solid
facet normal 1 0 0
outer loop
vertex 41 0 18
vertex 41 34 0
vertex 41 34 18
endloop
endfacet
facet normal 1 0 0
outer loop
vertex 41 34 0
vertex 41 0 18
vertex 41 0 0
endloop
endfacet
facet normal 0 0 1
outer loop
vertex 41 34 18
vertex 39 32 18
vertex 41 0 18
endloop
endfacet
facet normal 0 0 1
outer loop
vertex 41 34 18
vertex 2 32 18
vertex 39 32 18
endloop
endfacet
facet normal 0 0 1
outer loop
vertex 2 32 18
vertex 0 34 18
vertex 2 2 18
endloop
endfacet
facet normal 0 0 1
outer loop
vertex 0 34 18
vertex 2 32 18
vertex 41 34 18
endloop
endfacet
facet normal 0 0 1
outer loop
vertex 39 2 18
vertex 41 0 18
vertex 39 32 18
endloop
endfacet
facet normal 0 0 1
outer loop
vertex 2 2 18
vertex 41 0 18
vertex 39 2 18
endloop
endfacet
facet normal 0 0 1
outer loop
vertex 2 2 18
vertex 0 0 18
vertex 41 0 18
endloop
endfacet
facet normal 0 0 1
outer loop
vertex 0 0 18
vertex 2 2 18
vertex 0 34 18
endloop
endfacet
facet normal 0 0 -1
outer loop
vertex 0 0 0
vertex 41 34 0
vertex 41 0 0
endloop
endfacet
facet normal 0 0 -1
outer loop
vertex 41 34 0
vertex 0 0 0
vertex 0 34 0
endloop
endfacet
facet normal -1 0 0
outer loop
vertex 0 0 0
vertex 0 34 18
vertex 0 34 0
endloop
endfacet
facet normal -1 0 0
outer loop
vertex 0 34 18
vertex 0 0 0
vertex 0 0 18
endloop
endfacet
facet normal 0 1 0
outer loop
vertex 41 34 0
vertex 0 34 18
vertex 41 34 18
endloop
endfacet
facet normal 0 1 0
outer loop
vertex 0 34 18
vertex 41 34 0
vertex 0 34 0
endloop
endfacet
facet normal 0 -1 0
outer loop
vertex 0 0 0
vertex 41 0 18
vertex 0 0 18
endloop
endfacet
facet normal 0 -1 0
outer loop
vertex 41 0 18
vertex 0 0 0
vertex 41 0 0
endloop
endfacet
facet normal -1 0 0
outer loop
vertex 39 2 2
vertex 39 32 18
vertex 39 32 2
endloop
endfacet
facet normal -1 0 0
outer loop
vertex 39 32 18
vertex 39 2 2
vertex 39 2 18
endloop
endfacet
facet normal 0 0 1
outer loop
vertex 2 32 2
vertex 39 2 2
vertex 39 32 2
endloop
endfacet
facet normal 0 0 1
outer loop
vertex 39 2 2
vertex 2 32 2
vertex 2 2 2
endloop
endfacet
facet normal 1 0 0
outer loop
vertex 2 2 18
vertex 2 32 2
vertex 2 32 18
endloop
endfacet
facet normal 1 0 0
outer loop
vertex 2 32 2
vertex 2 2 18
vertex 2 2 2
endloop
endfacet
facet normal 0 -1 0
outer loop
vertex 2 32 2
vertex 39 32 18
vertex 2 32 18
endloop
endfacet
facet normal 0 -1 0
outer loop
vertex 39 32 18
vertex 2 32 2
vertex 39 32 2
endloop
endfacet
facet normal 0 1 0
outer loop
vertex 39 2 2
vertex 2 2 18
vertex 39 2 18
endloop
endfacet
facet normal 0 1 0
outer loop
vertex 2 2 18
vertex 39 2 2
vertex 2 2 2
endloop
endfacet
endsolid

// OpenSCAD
b_x = 37;
b_y = 30;
b_z = 14;
wall_thick = 2;
ovr_x = 1.5;
ovr_y = 1;
e = 0.1;

difference() {
    cube([b_x+wall_thick*2, b_y+wall_thick*2, b_z+wall_thick*2]);
    
    translate([wall_thick, wall_thick, wall_thick])
        cube([b_x, b_y, b_z]);
    
    // with overhang
//    translate([wall_thick+ovr_x, wall_thick+ovr_y, b_z+wall_thick-e])
//        cube([b_x-ovr_x*2, b_y-ovr_y*2, wall_thick+2*e]);

    // without overhang
    translate([wall_thick, wall_thick, b_z+wall_thick-e])
        cube([b_x, b_y, wall_thick+2*e]);


}
